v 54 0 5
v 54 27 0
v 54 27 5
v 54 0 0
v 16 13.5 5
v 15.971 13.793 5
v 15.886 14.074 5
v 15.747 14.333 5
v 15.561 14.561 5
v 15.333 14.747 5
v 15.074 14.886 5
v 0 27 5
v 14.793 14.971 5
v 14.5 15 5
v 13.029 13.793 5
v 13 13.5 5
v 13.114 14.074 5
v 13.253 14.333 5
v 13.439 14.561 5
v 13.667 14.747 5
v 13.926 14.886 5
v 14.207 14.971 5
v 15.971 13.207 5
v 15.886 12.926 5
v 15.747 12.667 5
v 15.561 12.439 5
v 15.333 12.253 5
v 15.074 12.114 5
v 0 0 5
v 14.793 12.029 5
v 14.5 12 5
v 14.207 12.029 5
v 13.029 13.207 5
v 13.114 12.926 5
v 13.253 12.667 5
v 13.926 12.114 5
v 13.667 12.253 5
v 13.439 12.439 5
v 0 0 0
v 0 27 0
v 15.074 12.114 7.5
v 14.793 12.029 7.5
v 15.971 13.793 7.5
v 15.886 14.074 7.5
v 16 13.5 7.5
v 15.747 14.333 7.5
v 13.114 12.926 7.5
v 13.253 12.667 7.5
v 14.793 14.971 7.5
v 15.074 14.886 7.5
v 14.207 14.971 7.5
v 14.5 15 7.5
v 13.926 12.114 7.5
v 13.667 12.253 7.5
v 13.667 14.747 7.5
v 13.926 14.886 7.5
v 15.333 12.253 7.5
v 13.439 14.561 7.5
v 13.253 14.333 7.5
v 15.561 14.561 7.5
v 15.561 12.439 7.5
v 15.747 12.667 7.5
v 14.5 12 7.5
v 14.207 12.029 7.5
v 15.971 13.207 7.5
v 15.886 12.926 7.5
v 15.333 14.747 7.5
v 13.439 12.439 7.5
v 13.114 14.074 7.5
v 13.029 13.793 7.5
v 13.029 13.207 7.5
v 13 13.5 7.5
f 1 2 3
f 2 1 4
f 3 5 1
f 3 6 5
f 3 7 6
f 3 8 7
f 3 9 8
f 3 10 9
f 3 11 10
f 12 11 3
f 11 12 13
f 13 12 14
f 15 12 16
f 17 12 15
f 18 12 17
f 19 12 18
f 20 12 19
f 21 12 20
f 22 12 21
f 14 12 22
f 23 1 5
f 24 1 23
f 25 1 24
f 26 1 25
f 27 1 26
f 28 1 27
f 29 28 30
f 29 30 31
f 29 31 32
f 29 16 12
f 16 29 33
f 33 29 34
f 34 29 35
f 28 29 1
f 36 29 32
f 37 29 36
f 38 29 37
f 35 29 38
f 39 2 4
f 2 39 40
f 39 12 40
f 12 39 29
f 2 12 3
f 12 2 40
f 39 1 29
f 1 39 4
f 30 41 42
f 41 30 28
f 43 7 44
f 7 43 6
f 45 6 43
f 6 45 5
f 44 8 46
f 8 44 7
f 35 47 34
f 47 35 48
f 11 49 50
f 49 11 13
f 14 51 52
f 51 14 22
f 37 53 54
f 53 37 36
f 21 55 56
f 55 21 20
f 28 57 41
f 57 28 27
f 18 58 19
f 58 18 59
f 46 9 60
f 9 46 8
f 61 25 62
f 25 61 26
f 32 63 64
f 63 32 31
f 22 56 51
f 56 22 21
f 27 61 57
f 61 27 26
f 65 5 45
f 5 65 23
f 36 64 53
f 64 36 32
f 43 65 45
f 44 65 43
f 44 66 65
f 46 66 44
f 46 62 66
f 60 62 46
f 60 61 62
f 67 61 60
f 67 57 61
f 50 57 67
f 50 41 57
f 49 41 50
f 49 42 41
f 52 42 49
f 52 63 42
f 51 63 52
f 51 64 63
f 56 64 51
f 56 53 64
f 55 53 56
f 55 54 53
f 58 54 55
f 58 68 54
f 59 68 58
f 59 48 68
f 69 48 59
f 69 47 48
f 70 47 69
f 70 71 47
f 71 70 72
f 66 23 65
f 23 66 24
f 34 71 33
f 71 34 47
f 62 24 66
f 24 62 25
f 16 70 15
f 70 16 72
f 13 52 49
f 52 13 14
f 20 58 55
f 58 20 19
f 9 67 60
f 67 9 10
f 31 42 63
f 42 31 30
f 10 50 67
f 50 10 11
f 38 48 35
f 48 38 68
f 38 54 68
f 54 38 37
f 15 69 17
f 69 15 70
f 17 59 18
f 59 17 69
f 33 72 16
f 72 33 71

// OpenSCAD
// file: config.scad
// --- Robot Dimensions ---
track_width = 50;        // mm
sprocket_diameter = 50;  // mm
motor_length = 54;       // mm
motor_shaft = 6;         // D-shaft diameter
motor_mount_hole = 3;    // M3
battery_length = 75;     // mm
battery_width  = 55;     // mm
battery_height = 20;     // mm
jetson_plate_length = 120; // mm
jetson_plate_width  = 100; // mm
chassis_thickness = 5;      // mm
// main file
include <config.scad>;

module motor_mount() {
    plate_thickness = 5;
    plate_length = motor_length;
    plate_width = motor_length / 2;

    // Mount plate
    cube([plate_length, plate_width, plate_thickness]);

    // M3 holes for D-shaft motor
    hole_spacing = 29; // typical front-face holes
    translate([hole_spacing/2, plate_width/2, plate_thickness/2])
        cylinder(h=plate_thickness, r=motor_mount_hole/2, $fn=32);
}

motor_mount();
